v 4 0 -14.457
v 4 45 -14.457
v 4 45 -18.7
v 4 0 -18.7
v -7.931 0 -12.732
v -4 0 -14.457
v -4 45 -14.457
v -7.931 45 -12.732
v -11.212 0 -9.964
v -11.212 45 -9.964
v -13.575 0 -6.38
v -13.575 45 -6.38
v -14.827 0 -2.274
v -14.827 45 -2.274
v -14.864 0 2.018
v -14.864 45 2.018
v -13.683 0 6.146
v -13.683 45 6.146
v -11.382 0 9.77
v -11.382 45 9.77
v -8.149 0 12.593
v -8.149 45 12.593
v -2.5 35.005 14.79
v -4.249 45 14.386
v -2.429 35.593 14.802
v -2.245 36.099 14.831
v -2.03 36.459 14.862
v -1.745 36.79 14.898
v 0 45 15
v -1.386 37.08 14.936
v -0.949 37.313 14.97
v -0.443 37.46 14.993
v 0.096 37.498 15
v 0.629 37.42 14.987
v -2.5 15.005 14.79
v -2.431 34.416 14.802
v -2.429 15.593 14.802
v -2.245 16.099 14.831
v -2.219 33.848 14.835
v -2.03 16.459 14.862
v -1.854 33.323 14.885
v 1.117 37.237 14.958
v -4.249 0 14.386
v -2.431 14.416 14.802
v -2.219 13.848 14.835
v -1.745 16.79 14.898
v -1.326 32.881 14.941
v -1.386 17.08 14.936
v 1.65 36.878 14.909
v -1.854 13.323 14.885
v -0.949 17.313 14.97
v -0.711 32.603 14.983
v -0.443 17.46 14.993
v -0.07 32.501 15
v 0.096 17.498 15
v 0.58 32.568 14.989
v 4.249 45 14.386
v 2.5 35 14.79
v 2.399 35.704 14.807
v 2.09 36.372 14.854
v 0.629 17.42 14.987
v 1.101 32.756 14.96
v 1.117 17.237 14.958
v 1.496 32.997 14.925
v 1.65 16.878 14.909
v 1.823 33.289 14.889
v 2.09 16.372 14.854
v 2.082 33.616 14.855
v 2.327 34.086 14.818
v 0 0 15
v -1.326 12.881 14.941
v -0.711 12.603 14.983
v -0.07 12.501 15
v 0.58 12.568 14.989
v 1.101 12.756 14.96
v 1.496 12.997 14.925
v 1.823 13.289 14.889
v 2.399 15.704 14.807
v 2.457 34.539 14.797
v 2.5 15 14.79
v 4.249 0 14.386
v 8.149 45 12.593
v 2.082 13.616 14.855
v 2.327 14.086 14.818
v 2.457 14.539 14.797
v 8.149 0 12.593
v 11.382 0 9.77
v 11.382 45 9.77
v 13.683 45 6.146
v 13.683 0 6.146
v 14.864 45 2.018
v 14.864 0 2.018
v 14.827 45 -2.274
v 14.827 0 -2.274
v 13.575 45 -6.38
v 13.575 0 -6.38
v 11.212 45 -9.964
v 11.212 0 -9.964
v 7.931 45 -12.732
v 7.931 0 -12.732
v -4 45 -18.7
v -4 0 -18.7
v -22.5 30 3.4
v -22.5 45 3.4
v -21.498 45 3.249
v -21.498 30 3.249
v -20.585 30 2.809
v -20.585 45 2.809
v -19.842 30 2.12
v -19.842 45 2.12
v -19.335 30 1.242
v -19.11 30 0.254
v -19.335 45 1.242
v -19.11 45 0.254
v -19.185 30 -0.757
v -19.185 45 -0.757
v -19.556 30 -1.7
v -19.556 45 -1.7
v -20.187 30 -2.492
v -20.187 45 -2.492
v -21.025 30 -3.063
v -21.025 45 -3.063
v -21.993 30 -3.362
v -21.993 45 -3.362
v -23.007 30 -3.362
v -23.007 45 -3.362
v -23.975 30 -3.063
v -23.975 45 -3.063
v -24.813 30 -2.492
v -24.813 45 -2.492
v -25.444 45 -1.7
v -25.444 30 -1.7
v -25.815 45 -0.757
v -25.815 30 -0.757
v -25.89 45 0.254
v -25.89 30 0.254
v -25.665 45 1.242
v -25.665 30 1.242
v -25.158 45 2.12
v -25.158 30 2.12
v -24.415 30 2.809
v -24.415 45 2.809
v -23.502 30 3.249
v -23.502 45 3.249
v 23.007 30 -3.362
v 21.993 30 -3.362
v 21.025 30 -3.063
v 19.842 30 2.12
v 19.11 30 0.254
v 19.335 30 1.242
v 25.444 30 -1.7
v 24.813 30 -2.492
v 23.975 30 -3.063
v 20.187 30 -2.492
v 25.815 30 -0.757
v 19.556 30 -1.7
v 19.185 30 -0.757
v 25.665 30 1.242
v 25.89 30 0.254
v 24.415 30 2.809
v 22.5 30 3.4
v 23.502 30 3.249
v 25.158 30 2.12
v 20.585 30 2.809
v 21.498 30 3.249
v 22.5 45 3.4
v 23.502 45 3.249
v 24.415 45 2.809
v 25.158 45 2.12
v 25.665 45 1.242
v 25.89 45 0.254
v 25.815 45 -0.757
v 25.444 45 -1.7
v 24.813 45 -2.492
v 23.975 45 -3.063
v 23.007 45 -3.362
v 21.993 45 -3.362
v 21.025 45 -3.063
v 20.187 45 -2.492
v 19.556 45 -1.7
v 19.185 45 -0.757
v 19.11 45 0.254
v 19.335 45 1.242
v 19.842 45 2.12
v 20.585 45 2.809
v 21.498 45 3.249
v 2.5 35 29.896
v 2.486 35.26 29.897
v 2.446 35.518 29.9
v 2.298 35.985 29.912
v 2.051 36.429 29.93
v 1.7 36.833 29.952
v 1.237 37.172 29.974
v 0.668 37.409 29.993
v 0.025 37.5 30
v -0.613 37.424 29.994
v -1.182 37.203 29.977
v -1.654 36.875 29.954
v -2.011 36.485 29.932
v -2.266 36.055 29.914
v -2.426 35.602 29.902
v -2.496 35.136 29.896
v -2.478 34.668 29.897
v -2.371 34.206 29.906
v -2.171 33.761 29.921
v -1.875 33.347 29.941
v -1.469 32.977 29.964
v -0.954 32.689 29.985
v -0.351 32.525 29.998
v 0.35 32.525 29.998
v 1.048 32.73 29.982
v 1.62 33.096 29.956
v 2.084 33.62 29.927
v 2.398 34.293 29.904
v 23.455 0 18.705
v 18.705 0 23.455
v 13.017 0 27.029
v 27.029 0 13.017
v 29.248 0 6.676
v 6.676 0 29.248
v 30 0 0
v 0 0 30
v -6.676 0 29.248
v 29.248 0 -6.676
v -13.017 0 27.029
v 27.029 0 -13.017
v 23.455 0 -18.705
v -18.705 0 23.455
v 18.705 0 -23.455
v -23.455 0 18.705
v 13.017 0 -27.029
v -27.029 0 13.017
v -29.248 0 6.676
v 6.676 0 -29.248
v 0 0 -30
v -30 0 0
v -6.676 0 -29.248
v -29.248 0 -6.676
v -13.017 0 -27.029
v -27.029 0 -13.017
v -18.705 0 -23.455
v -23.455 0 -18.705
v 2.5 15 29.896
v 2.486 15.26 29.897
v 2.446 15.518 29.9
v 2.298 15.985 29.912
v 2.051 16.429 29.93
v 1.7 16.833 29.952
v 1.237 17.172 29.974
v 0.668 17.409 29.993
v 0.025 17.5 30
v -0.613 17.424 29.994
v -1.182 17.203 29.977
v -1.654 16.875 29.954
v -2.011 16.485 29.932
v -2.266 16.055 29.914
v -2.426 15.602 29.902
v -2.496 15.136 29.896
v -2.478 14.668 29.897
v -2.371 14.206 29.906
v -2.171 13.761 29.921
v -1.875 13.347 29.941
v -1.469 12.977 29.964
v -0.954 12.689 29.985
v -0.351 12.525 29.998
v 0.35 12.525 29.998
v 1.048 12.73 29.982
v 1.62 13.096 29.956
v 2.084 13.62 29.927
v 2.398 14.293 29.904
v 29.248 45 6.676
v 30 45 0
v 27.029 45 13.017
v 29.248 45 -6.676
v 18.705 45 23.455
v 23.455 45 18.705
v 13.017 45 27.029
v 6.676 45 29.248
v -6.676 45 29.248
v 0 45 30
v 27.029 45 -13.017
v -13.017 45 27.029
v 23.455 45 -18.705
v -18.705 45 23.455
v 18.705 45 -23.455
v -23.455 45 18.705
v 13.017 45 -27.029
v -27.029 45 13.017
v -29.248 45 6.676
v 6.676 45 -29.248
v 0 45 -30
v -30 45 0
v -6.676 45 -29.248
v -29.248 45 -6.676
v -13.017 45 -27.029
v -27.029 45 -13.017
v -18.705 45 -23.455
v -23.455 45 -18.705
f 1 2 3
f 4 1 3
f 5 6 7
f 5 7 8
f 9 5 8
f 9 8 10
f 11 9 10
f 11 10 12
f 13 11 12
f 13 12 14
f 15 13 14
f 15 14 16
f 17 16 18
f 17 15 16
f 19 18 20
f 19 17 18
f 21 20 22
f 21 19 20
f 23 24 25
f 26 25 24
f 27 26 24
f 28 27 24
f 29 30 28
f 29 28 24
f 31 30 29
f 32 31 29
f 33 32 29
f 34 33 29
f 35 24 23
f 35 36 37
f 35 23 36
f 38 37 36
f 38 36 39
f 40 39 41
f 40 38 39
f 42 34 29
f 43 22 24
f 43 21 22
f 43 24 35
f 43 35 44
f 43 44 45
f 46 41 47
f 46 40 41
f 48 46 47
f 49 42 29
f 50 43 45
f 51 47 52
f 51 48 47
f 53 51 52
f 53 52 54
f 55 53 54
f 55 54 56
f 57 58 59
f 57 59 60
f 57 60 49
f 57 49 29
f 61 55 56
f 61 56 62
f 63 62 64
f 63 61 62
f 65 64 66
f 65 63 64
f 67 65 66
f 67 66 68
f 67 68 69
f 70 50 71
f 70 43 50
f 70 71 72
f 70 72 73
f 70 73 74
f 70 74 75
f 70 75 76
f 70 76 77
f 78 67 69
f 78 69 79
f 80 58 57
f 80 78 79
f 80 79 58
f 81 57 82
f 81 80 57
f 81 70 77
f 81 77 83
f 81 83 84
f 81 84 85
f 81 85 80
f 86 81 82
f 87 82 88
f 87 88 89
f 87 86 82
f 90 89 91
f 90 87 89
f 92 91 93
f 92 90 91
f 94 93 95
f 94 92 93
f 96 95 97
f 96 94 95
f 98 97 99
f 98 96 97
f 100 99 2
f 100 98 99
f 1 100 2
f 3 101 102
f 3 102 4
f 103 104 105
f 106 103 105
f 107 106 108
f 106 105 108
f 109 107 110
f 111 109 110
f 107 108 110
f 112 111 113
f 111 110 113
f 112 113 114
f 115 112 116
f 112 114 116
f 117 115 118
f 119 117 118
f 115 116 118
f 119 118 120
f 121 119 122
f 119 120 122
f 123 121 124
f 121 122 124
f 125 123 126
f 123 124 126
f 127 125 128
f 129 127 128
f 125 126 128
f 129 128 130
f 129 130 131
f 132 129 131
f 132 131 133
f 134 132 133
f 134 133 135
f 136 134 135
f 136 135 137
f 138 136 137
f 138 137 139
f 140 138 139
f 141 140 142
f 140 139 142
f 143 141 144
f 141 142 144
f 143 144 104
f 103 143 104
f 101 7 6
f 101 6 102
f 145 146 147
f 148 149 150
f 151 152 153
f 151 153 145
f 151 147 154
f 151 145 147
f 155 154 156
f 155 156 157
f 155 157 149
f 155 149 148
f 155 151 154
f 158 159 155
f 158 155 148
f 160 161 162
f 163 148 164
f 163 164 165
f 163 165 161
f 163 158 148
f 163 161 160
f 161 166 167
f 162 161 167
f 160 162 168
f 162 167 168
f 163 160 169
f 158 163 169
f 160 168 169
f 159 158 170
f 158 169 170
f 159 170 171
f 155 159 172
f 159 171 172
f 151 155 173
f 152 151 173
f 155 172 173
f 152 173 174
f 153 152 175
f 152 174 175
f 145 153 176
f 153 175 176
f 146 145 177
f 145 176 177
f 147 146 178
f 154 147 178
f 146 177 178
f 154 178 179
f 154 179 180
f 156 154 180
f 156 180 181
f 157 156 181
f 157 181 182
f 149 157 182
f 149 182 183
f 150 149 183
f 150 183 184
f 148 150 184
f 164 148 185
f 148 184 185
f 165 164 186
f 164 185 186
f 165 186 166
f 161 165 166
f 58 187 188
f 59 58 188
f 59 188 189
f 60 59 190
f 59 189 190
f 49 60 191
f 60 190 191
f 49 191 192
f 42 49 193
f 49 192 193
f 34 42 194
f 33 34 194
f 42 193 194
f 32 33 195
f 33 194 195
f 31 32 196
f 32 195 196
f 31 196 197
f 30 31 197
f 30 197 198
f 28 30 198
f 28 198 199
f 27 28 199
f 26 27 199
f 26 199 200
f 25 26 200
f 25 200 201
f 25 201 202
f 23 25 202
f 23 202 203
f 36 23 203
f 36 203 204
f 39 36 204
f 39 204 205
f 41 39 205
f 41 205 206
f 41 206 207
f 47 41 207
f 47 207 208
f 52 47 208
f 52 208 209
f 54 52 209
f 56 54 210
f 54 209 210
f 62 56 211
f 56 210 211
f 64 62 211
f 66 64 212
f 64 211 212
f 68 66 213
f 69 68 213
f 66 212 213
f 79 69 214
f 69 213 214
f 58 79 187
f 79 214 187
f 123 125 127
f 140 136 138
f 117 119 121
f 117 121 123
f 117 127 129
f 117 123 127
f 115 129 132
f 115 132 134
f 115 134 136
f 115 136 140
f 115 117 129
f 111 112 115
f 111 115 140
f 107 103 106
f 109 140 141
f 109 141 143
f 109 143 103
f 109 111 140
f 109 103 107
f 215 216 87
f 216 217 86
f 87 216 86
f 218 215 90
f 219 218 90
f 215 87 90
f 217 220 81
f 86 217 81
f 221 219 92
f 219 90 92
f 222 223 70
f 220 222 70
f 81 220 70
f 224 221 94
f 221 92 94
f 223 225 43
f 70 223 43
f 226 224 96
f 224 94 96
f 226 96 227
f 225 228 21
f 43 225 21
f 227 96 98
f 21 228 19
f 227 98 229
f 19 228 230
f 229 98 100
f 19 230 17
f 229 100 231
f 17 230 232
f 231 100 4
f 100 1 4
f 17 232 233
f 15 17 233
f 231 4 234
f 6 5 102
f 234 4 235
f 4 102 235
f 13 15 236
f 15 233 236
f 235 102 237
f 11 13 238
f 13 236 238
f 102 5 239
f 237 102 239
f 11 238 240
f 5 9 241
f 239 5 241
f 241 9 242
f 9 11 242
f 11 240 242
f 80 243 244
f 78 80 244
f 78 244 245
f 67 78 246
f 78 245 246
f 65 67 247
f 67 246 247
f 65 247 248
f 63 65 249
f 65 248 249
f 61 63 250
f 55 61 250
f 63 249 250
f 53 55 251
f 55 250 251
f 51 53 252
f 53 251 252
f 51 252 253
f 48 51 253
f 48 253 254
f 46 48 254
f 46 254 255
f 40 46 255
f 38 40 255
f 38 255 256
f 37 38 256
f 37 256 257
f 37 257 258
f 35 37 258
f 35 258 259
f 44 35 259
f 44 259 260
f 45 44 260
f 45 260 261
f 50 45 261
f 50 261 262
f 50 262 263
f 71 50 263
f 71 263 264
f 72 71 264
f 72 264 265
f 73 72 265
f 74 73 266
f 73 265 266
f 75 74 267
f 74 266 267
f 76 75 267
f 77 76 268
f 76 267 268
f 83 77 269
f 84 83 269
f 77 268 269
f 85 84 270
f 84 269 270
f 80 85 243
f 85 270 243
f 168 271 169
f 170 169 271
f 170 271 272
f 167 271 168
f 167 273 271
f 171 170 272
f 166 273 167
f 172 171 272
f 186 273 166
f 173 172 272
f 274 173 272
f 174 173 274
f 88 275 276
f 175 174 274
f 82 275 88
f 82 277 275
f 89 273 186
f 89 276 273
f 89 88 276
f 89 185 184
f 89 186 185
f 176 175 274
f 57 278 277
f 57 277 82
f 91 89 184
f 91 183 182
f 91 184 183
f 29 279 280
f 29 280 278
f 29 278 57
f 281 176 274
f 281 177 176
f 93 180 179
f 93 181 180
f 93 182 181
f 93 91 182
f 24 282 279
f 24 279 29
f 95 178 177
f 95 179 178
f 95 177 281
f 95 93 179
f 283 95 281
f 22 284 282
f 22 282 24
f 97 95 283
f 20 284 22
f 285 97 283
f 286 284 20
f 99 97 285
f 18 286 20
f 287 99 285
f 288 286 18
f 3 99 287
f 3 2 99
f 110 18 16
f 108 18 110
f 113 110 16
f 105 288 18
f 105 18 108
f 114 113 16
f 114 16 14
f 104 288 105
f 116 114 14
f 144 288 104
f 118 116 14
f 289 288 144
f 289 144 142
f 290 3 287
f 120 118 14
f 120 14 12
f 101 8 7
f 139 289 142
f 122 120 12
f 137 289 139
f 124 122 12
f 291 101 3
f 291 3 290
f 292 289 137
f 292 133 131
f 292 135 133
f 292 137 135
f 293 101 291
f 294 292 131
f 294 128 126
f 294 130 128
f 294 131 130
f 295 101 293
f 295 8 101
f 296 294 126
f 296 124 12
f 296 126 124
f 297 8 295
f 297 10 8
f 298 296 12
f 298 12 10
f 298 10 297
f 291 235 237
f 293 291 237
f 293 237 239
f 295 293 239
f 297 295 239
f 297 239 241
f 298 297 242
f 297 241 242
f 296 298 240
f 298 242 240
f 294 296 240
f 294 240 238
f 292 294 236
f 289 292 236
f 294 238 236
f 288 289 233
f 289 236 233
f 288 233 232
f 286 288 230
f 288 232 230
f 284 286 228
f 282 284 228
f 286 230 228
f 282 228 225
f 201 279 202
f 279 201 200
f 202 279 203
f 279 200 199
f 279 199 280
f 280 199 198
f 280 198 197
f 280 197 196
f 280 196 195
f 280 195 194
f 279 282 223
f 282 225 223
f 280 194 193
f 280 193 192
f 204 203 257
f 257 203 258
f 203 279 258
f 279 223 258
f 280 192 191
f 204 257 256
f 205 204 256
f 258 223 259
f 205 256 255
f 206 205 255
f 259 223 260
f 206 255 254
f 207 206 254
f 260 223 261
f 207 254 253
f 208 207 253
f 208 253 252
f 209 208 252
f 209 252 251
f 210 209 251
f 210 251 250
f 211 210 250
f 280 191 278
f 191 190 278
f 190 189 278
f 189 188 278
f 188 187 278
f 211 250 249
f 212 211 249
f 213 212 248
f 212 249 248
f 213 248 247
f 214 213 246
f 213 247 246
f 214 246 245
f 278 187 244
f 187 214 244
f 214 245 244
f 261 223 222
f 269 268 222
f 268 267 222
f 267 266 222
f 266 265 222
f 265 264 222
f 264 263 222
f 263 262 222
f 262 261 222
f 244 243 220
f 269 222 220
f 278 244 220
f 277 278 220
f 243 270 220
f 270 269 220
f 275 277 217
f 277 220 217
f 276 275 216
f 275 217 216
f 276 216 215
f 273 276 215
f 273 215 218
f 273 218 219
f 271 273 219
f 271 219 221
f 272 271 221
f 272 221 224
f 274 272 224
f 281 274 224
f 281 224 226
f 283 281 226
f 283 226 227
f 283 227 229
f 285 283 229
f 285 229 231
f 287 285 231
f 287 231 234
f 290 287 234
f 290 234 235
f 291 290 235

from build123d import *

# Parameters (mm, degrees)
SKETCH2_R           = 30
SKETCH2_R_2         = 15
BOSS_EXTRUDE1_DEPTH = 45
SKETCH5_R           = 3.4
CUT_EXTRUDE2_DEPTH  = 15
SKETCH7_R           = 2.5
CUT_EXTRUDE3_DEPTH  = 23
SKETCH8_W           = 8
SKETCH8_H           = 6
CUT_EXTRUDE4_DEPTH  = 62.846584554


with BuildPart() as part:
    # Sketch2 → Boss-Extrude1 (new body)
    with BuildSketch(Plane(origin=(0, 0, 0), x_dir=(1, 0, 0), z_dir=(0, 1, 0))):
        with Locations(Location((0, 0, 0), (0, 0, 90))):
            Circle(SKETCH2_R)
        with Locations(Location((0, 0, 0), (0, 0, 90))):
            Circle(SKETCH2_R_2, mode=Mode.SUBTRACT)
    extrude(amount=BOSS_EXTRUDE1_DEPTH)

    # Sketch5 → Cut-Extrude2 (cut)
    with BuildSketch(Plane(origin=(0, 45, 0), x_dir=(1, 0, 0), z_dir=(0, 1, 0))):
        with Locations(Location((22.5, 0, 0), (0, 0, 270))):
            Circle(SKETCH5_R)
        with Locations(Location((-22.5, 0, 0), (0, 0, 270))):
            Circle(SKETCH5_R)
    extrude(amount=-CUT_EXTRUDE2_DEPTH, mode=Mode.SUBTRACT)

    # Sketch7 → Cut-Extrude3 (cut)
    with BuildSketch(Plane.XY.offset(30)):
        with Locations((0, 35)):
            Circle(SKETCH7_R)
        with Locations((0, 15)):
            Circle(SKETCH7_R)
    extrude(amount=-CUT_EXTRUDE3_DEPTH, mode=Mode.SUBTRACT)

    # Sketch8 → Cut-Extrude4 (cut, through all)
    with BuildSketch(Plane(origin=(0, 45, 0), x_dir=(1, 0, 0), z_dir=(0, 1, 0))):
        with Locations((0, 15.7)):
            Rectangle(SKETCH8_W, SKETCH8_H)
    extrude(amount=-CUT_EXTRUDE4_DEPTH, mode=Mode.SUBTRACT)


solid = part.part
